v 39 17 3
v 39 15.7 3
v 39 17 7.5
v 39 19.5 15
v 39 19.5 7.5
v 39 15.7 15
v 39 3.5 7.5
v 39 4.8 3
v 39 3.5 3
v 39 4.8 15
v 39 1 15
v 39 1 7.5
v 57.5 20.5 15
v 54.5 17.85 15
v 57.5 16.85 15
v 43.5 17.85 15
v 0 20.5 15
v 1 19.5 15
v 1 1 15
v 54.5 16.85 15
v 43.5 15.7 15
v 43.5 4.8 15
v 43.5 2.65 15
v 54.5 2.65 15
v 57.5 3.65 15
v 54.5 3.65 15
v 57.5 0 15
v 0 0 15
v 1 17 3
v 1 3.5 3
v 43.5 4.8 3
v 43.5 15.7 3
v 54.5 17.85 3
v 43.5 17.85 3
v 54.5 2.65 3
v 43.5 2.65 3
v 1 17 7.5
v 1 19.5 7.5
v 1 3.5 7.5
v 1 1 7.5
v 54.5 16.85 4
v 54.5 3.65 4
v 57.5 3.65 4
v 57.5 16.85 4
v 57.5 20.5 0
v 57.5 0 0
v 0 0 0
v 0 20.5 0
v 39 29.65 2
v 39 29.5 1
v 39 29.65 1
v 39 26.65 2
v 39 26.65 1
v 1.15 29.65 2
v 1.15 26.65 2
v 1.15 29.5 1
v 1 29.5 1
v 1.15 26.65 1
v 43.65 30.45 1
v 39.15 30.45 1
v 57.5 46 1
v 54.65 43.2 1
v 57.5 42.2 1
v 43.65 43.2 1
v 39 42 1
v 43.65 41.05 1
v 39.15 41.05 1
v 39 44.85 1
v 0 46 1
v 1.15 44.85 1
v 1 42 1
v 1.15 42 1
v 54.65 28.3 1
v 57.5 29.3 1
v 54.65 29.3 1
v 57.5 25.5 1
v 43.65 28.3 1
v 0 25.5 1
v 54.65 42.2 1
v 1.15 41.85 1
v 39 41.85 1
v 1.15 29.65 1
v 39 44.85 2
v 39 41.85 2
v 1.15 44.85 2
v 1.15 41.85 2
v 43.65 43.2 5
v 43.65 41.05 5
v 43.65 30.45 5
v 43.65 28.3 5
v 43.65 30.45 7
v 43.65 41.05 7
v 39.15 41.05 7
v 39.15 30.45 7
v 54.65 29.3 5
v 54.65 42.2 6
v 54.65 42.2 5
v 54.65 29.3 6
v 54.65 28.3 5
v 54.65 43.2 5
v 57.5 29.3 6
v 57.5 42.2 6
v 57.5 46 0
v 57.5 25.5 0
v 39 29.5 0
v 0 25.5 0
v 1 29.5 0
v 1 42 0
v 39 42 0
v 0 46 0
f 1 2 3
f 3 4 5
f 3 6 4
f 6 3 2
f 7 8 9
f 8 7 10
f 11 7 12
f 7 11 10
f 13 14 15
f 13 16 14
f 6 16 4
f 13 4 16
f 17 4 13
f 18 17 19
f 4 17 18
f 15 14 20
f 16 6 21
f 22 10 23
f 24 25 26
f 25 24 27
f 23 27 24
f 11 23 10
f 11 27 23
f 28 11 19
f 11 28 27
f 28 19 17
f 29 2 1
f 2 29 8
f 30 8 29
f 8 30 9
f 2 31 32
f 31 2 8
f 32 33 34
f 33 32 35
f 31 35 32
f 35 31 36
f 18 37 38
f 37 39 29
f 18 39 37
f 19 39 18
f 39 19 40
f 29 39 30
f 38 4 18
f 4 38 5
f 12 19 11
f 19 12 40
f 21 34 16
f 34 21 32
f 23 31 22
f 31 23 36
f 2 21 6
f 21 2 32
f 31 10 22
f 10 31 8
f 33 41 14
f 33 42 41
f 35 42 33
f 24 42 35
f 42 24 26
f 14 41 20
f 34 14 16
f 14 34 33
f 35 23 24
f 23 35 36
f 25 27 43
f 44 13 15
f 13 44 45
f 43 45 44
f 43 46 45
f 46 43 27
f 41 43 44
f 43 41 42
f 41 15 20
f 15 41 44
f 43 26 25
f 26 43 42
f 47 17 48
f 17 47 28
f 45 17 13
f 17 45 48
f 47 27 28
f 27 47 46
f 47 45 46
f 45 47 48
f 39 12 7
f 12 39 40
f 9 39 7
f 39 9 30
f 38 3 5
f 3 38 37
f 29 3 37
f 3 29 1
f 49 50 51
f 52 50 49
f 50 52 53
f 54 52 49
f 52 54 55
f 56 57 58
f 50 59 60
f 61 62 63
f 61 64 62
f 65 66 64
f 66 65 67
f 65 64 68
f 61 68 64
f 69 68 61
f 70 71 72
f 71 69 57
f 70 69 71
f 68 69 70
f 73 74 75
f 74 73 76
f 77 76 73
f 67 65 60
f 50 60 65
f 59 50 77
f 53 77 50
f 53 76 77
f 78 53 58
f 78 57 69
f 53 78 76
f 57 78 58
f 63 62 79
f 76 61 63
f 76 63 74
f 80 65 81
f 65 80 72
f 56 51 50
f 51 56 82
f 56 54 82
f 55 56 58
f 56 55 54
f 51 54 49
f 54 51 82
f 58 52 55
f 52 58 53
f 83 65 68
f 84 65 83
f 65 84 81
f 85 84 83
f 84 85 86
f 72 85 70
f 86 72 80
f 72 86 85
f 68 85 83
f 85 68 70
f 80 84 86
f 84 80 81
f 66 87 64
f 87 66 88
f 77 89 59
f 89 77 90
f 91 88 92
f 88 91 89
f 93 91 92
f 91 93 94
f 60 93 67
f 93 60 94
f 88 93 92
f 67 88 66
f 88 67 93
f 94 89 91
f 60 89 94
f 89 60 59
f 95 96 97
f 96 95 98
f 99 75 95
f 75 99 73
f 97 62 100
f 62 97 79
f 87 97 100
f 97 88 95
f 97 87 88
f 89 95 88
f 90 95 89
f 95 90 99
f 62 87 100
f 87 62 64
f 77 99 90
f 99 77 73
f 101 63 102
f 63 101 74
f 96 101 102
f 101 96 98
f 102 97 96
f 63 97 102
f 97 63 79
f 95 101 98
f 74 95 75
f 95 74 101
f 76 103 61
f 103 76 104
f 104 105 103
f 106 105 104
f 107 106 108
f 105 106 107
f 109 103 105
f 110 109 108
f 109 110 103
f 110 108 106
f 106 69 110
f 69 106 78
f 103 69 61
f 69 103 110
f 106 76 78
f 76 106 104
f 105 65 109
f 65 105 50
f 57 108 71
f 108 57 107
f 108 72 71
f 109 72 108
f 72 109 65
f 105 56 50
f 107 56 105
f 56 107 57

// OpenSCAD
// Gemeinsame Parameter für beide Module
laenge = 56.5;    // von 53.5 auf 56.5 erhöht, um den vorderen Raum auf 11mm zu vergrößern
breite_hinten = 18.5;  
breite_vorne = 15.2;   
wandstaerke = 1;   
bodenstaerke = 3;
hoehe = 12;

// Verdickungsparameter
verdickung_abstand = 38;    
verdickung_laenge = 4.5;     
verdickung_tiefe = 3.8;
verdickung_ende = verdickung_abstand + verdickung_laenge;

// Parameter für die vordere Verengung
verengung_tiefe = 1;  // 1mm Verengung von allen Seiten
verengung_hoehe = 5;  // Höhe der Verengung
verengung_laenge = 3; // Länge der Verengung

// Deckelparameter
deckel_hoehe = 1;
seitenwand_breite = 3;  // Breite der Seitenwände im Deckel

// Höhen der Deckelprägungen
deckel_hoehe_hinten = 6;      // Höhe des mittleren Bereichs (Verdickung) - ehemals deckel_hoehe_mitte
deckel_hoehe_mitte = 4;       // Höhe des vorderen normalen Teils - ehemals deckel_hoehe_vorne
deckel_hoehe_vorne = 5;       // Höhe des vorderen verengten Teils (am Ende) - ehemals deckel_hoehe_verengung

// Parameter für die Verdickungen im U-Profil
verdickung_breite = 2.5;      // Breite der Verdickungen in mm
verdickung_hoehe = 4.5;       // Höhe der Verdickungen in mm

// Presspassung - negative Werte = enger, positive = lockerer
presspassung = 0.15;  

// Äußere Breite
aussen_breite = breite_hinten + (2 * wandstaerke);

// Ein- und Ausblenden von Komponenten
show_fixes = true;    // Bool-Variable zum Aktivieren/Deaktivieren der Verdickungen
show_deckel = true;   // Bool-Variable zum Ein-/Ausblenden des Deckels
show_case = true;     // Bool-Variable zum Ein-/Ausblenden des Cases

// Variable für die Lochposition im Deckel
loch_im_deckel = true; // Bool-Variable zum Ein-/Ausblenden des Lochs im Deckel

// Modul für das U-Profil
module u_profil() {
    union() {
        // Boden
        cube([laenge + wandstaerke, aussen_breite, bodenstaerke]);
        
        difference() {
            // Äußerer Block für alle Wände
            translate([0, 0, bodenstaerke])
                cube([laenge + wandstaerke, aussen_breite, hoehe]);
            
            // Innere Ausschnitte
            translate([wandstaerke, wandstaerke, bodenstaerke]) {
                // Ausschnitt bis zur Verdickung
                cube([verdickung_abstand, breite_hinten, hoehe]);
                
                // Ausschnitt im Bereich der Verdickung
                translate([verdickung_abstand, verdickung_tiefe, 0])
                    cube([verdickung_laenge, breite_hinten - (2 * verdickung_tiefe), hoehe]);
                
                // Ausschnitt nach der Verdickung (bis zur Verengung)
                translate([verdickung_ende, (breite_hinten - breite_vorne) / 2, 0])
                    cube([laenge - verdickung_ende - verengung_laenge, breite_vorne, hoehe]);
                
                // Ausschnitt für die vordere Verengung (schmaler und höher)
                translate([laenge - verengung_laenge, (breite_hinten - breite_vorne) / 2 + verengung_tiefe, verengung_tiefe])
                    cube([verengung_laenge, breite_vorne - (2 * verengung_tiefe), hoehe - verengung_tiefe]);
            }
        }
    }
}

// Modul für den Deckel mit Loch zwischen den Seitenwänden
module deckel() {
    difference() {
        union() {
            // Deckelplatte 
            cube([laenge + wandstaerke, aussen_breite, deckel_hoehe]);
            
            // Männliche Prägung (nach oben)
            translate([wandstaerke + presspassung, wandstaerke + presspassung, deckel_hoehe]) {
                union() {
                    // Linke Seitenwand
                    cube([verdickung_abstand - presspassung, seitenwand_breite, 1]);
                    
                    // Rechte Seitenwand
                    translate([0, breite_hinten - (2 * presspassung) - seitenwand_breite, 0])
                        cube([verdickung_abstand - presspassung, seitenwand_breite, 1]);
                    
                    // Mittlerer Bereich (mit Verdickung)
                    translate([verdickung_abstand, verdickung_tiefe, 0])
                        cube([verdickung_laenge, breite_hinten - (2 * verdickung_tiefe) - (2 * presspassung), deckel_hoehe_hinten]);
                    
                    // Vorderer Bereich (bis zur Verengung) - ohne Spalt zum verengten Teil
                    translate([verdickung_ende, (breite_hinten - breite_vorne) / 2, 0])
                        cube([laenge - verdickung_ende - verengung_laenge, breite_vorne - (2 * presspassung), deckel_hoehe_mitte]);
                    
                    // Verengter Bereich (am Ende) 
                    translate([laenge - verengung_laenge, (breite_hinten - breite_vorne) / 2 + verengung_tiefe, 0])
                        cube([verengung_laenge - presspassung, breite_vorne - (2 * verengung_tiefe) - (2 * presspassung), deckel_hoehe_vorne]);
                }
            }
        }
        
        // Loch zwischen den Seitenwänden im Deckel, wenn aktiviert
        if (loch_im_deckel) {
            loch_breite = breite_hinten - (2 * seitenwand_breite);
            loch_y_start = wandstaerke + seitenwand_breite;
            
            // Einfaches Loch genau zwischen den beiden Seitenwänden
            translate([wandstaerke, loch_y_start, 0])
                cube([verdickung_abstand, loch_breite, deckel_hoehe]);
        }
    }
}

// Modul für die Verdickungen im U-Profil
module fixes() {
    // Linke Verdickung (innere linke Wand) - nur bis zur Verdickung
    translate([wandstaerke, wandstaerke, bodenstaerke]) {
        cube([verdickung_abstand, verdickung_breite, verdickung_hoehe]);
    }
    
    // Rechte Verdickung (innere rechte Wand) - nur bis zur Verdickung
    translate([wandstaerke, aussen_breite - wandstaerke - verdickung_breite, bodenstaerke]) {
        cube([verdickung_abstand, verdickung_breite, verdickung_hoehe]);
    }
}

// Hauptmodul zum Zusammenfügen
module main() {
    // U-Profil anzeigen, wenn aktiviert
    if (show_case) {
        u_profil();
        
        // Änderungen/Fixes anzeigen, wenn aktiviert
        if (show_fixes) {
            fixes();
        }
    }
    
    // Deckel anzeigen, wenn aktiviert (mit 5mm Abstand)
    if (show_deckel) {
        translate([0, aussen_breite + 5, 0]) deckel();
    }
}

// Hauptmodul aufrufen
main();
